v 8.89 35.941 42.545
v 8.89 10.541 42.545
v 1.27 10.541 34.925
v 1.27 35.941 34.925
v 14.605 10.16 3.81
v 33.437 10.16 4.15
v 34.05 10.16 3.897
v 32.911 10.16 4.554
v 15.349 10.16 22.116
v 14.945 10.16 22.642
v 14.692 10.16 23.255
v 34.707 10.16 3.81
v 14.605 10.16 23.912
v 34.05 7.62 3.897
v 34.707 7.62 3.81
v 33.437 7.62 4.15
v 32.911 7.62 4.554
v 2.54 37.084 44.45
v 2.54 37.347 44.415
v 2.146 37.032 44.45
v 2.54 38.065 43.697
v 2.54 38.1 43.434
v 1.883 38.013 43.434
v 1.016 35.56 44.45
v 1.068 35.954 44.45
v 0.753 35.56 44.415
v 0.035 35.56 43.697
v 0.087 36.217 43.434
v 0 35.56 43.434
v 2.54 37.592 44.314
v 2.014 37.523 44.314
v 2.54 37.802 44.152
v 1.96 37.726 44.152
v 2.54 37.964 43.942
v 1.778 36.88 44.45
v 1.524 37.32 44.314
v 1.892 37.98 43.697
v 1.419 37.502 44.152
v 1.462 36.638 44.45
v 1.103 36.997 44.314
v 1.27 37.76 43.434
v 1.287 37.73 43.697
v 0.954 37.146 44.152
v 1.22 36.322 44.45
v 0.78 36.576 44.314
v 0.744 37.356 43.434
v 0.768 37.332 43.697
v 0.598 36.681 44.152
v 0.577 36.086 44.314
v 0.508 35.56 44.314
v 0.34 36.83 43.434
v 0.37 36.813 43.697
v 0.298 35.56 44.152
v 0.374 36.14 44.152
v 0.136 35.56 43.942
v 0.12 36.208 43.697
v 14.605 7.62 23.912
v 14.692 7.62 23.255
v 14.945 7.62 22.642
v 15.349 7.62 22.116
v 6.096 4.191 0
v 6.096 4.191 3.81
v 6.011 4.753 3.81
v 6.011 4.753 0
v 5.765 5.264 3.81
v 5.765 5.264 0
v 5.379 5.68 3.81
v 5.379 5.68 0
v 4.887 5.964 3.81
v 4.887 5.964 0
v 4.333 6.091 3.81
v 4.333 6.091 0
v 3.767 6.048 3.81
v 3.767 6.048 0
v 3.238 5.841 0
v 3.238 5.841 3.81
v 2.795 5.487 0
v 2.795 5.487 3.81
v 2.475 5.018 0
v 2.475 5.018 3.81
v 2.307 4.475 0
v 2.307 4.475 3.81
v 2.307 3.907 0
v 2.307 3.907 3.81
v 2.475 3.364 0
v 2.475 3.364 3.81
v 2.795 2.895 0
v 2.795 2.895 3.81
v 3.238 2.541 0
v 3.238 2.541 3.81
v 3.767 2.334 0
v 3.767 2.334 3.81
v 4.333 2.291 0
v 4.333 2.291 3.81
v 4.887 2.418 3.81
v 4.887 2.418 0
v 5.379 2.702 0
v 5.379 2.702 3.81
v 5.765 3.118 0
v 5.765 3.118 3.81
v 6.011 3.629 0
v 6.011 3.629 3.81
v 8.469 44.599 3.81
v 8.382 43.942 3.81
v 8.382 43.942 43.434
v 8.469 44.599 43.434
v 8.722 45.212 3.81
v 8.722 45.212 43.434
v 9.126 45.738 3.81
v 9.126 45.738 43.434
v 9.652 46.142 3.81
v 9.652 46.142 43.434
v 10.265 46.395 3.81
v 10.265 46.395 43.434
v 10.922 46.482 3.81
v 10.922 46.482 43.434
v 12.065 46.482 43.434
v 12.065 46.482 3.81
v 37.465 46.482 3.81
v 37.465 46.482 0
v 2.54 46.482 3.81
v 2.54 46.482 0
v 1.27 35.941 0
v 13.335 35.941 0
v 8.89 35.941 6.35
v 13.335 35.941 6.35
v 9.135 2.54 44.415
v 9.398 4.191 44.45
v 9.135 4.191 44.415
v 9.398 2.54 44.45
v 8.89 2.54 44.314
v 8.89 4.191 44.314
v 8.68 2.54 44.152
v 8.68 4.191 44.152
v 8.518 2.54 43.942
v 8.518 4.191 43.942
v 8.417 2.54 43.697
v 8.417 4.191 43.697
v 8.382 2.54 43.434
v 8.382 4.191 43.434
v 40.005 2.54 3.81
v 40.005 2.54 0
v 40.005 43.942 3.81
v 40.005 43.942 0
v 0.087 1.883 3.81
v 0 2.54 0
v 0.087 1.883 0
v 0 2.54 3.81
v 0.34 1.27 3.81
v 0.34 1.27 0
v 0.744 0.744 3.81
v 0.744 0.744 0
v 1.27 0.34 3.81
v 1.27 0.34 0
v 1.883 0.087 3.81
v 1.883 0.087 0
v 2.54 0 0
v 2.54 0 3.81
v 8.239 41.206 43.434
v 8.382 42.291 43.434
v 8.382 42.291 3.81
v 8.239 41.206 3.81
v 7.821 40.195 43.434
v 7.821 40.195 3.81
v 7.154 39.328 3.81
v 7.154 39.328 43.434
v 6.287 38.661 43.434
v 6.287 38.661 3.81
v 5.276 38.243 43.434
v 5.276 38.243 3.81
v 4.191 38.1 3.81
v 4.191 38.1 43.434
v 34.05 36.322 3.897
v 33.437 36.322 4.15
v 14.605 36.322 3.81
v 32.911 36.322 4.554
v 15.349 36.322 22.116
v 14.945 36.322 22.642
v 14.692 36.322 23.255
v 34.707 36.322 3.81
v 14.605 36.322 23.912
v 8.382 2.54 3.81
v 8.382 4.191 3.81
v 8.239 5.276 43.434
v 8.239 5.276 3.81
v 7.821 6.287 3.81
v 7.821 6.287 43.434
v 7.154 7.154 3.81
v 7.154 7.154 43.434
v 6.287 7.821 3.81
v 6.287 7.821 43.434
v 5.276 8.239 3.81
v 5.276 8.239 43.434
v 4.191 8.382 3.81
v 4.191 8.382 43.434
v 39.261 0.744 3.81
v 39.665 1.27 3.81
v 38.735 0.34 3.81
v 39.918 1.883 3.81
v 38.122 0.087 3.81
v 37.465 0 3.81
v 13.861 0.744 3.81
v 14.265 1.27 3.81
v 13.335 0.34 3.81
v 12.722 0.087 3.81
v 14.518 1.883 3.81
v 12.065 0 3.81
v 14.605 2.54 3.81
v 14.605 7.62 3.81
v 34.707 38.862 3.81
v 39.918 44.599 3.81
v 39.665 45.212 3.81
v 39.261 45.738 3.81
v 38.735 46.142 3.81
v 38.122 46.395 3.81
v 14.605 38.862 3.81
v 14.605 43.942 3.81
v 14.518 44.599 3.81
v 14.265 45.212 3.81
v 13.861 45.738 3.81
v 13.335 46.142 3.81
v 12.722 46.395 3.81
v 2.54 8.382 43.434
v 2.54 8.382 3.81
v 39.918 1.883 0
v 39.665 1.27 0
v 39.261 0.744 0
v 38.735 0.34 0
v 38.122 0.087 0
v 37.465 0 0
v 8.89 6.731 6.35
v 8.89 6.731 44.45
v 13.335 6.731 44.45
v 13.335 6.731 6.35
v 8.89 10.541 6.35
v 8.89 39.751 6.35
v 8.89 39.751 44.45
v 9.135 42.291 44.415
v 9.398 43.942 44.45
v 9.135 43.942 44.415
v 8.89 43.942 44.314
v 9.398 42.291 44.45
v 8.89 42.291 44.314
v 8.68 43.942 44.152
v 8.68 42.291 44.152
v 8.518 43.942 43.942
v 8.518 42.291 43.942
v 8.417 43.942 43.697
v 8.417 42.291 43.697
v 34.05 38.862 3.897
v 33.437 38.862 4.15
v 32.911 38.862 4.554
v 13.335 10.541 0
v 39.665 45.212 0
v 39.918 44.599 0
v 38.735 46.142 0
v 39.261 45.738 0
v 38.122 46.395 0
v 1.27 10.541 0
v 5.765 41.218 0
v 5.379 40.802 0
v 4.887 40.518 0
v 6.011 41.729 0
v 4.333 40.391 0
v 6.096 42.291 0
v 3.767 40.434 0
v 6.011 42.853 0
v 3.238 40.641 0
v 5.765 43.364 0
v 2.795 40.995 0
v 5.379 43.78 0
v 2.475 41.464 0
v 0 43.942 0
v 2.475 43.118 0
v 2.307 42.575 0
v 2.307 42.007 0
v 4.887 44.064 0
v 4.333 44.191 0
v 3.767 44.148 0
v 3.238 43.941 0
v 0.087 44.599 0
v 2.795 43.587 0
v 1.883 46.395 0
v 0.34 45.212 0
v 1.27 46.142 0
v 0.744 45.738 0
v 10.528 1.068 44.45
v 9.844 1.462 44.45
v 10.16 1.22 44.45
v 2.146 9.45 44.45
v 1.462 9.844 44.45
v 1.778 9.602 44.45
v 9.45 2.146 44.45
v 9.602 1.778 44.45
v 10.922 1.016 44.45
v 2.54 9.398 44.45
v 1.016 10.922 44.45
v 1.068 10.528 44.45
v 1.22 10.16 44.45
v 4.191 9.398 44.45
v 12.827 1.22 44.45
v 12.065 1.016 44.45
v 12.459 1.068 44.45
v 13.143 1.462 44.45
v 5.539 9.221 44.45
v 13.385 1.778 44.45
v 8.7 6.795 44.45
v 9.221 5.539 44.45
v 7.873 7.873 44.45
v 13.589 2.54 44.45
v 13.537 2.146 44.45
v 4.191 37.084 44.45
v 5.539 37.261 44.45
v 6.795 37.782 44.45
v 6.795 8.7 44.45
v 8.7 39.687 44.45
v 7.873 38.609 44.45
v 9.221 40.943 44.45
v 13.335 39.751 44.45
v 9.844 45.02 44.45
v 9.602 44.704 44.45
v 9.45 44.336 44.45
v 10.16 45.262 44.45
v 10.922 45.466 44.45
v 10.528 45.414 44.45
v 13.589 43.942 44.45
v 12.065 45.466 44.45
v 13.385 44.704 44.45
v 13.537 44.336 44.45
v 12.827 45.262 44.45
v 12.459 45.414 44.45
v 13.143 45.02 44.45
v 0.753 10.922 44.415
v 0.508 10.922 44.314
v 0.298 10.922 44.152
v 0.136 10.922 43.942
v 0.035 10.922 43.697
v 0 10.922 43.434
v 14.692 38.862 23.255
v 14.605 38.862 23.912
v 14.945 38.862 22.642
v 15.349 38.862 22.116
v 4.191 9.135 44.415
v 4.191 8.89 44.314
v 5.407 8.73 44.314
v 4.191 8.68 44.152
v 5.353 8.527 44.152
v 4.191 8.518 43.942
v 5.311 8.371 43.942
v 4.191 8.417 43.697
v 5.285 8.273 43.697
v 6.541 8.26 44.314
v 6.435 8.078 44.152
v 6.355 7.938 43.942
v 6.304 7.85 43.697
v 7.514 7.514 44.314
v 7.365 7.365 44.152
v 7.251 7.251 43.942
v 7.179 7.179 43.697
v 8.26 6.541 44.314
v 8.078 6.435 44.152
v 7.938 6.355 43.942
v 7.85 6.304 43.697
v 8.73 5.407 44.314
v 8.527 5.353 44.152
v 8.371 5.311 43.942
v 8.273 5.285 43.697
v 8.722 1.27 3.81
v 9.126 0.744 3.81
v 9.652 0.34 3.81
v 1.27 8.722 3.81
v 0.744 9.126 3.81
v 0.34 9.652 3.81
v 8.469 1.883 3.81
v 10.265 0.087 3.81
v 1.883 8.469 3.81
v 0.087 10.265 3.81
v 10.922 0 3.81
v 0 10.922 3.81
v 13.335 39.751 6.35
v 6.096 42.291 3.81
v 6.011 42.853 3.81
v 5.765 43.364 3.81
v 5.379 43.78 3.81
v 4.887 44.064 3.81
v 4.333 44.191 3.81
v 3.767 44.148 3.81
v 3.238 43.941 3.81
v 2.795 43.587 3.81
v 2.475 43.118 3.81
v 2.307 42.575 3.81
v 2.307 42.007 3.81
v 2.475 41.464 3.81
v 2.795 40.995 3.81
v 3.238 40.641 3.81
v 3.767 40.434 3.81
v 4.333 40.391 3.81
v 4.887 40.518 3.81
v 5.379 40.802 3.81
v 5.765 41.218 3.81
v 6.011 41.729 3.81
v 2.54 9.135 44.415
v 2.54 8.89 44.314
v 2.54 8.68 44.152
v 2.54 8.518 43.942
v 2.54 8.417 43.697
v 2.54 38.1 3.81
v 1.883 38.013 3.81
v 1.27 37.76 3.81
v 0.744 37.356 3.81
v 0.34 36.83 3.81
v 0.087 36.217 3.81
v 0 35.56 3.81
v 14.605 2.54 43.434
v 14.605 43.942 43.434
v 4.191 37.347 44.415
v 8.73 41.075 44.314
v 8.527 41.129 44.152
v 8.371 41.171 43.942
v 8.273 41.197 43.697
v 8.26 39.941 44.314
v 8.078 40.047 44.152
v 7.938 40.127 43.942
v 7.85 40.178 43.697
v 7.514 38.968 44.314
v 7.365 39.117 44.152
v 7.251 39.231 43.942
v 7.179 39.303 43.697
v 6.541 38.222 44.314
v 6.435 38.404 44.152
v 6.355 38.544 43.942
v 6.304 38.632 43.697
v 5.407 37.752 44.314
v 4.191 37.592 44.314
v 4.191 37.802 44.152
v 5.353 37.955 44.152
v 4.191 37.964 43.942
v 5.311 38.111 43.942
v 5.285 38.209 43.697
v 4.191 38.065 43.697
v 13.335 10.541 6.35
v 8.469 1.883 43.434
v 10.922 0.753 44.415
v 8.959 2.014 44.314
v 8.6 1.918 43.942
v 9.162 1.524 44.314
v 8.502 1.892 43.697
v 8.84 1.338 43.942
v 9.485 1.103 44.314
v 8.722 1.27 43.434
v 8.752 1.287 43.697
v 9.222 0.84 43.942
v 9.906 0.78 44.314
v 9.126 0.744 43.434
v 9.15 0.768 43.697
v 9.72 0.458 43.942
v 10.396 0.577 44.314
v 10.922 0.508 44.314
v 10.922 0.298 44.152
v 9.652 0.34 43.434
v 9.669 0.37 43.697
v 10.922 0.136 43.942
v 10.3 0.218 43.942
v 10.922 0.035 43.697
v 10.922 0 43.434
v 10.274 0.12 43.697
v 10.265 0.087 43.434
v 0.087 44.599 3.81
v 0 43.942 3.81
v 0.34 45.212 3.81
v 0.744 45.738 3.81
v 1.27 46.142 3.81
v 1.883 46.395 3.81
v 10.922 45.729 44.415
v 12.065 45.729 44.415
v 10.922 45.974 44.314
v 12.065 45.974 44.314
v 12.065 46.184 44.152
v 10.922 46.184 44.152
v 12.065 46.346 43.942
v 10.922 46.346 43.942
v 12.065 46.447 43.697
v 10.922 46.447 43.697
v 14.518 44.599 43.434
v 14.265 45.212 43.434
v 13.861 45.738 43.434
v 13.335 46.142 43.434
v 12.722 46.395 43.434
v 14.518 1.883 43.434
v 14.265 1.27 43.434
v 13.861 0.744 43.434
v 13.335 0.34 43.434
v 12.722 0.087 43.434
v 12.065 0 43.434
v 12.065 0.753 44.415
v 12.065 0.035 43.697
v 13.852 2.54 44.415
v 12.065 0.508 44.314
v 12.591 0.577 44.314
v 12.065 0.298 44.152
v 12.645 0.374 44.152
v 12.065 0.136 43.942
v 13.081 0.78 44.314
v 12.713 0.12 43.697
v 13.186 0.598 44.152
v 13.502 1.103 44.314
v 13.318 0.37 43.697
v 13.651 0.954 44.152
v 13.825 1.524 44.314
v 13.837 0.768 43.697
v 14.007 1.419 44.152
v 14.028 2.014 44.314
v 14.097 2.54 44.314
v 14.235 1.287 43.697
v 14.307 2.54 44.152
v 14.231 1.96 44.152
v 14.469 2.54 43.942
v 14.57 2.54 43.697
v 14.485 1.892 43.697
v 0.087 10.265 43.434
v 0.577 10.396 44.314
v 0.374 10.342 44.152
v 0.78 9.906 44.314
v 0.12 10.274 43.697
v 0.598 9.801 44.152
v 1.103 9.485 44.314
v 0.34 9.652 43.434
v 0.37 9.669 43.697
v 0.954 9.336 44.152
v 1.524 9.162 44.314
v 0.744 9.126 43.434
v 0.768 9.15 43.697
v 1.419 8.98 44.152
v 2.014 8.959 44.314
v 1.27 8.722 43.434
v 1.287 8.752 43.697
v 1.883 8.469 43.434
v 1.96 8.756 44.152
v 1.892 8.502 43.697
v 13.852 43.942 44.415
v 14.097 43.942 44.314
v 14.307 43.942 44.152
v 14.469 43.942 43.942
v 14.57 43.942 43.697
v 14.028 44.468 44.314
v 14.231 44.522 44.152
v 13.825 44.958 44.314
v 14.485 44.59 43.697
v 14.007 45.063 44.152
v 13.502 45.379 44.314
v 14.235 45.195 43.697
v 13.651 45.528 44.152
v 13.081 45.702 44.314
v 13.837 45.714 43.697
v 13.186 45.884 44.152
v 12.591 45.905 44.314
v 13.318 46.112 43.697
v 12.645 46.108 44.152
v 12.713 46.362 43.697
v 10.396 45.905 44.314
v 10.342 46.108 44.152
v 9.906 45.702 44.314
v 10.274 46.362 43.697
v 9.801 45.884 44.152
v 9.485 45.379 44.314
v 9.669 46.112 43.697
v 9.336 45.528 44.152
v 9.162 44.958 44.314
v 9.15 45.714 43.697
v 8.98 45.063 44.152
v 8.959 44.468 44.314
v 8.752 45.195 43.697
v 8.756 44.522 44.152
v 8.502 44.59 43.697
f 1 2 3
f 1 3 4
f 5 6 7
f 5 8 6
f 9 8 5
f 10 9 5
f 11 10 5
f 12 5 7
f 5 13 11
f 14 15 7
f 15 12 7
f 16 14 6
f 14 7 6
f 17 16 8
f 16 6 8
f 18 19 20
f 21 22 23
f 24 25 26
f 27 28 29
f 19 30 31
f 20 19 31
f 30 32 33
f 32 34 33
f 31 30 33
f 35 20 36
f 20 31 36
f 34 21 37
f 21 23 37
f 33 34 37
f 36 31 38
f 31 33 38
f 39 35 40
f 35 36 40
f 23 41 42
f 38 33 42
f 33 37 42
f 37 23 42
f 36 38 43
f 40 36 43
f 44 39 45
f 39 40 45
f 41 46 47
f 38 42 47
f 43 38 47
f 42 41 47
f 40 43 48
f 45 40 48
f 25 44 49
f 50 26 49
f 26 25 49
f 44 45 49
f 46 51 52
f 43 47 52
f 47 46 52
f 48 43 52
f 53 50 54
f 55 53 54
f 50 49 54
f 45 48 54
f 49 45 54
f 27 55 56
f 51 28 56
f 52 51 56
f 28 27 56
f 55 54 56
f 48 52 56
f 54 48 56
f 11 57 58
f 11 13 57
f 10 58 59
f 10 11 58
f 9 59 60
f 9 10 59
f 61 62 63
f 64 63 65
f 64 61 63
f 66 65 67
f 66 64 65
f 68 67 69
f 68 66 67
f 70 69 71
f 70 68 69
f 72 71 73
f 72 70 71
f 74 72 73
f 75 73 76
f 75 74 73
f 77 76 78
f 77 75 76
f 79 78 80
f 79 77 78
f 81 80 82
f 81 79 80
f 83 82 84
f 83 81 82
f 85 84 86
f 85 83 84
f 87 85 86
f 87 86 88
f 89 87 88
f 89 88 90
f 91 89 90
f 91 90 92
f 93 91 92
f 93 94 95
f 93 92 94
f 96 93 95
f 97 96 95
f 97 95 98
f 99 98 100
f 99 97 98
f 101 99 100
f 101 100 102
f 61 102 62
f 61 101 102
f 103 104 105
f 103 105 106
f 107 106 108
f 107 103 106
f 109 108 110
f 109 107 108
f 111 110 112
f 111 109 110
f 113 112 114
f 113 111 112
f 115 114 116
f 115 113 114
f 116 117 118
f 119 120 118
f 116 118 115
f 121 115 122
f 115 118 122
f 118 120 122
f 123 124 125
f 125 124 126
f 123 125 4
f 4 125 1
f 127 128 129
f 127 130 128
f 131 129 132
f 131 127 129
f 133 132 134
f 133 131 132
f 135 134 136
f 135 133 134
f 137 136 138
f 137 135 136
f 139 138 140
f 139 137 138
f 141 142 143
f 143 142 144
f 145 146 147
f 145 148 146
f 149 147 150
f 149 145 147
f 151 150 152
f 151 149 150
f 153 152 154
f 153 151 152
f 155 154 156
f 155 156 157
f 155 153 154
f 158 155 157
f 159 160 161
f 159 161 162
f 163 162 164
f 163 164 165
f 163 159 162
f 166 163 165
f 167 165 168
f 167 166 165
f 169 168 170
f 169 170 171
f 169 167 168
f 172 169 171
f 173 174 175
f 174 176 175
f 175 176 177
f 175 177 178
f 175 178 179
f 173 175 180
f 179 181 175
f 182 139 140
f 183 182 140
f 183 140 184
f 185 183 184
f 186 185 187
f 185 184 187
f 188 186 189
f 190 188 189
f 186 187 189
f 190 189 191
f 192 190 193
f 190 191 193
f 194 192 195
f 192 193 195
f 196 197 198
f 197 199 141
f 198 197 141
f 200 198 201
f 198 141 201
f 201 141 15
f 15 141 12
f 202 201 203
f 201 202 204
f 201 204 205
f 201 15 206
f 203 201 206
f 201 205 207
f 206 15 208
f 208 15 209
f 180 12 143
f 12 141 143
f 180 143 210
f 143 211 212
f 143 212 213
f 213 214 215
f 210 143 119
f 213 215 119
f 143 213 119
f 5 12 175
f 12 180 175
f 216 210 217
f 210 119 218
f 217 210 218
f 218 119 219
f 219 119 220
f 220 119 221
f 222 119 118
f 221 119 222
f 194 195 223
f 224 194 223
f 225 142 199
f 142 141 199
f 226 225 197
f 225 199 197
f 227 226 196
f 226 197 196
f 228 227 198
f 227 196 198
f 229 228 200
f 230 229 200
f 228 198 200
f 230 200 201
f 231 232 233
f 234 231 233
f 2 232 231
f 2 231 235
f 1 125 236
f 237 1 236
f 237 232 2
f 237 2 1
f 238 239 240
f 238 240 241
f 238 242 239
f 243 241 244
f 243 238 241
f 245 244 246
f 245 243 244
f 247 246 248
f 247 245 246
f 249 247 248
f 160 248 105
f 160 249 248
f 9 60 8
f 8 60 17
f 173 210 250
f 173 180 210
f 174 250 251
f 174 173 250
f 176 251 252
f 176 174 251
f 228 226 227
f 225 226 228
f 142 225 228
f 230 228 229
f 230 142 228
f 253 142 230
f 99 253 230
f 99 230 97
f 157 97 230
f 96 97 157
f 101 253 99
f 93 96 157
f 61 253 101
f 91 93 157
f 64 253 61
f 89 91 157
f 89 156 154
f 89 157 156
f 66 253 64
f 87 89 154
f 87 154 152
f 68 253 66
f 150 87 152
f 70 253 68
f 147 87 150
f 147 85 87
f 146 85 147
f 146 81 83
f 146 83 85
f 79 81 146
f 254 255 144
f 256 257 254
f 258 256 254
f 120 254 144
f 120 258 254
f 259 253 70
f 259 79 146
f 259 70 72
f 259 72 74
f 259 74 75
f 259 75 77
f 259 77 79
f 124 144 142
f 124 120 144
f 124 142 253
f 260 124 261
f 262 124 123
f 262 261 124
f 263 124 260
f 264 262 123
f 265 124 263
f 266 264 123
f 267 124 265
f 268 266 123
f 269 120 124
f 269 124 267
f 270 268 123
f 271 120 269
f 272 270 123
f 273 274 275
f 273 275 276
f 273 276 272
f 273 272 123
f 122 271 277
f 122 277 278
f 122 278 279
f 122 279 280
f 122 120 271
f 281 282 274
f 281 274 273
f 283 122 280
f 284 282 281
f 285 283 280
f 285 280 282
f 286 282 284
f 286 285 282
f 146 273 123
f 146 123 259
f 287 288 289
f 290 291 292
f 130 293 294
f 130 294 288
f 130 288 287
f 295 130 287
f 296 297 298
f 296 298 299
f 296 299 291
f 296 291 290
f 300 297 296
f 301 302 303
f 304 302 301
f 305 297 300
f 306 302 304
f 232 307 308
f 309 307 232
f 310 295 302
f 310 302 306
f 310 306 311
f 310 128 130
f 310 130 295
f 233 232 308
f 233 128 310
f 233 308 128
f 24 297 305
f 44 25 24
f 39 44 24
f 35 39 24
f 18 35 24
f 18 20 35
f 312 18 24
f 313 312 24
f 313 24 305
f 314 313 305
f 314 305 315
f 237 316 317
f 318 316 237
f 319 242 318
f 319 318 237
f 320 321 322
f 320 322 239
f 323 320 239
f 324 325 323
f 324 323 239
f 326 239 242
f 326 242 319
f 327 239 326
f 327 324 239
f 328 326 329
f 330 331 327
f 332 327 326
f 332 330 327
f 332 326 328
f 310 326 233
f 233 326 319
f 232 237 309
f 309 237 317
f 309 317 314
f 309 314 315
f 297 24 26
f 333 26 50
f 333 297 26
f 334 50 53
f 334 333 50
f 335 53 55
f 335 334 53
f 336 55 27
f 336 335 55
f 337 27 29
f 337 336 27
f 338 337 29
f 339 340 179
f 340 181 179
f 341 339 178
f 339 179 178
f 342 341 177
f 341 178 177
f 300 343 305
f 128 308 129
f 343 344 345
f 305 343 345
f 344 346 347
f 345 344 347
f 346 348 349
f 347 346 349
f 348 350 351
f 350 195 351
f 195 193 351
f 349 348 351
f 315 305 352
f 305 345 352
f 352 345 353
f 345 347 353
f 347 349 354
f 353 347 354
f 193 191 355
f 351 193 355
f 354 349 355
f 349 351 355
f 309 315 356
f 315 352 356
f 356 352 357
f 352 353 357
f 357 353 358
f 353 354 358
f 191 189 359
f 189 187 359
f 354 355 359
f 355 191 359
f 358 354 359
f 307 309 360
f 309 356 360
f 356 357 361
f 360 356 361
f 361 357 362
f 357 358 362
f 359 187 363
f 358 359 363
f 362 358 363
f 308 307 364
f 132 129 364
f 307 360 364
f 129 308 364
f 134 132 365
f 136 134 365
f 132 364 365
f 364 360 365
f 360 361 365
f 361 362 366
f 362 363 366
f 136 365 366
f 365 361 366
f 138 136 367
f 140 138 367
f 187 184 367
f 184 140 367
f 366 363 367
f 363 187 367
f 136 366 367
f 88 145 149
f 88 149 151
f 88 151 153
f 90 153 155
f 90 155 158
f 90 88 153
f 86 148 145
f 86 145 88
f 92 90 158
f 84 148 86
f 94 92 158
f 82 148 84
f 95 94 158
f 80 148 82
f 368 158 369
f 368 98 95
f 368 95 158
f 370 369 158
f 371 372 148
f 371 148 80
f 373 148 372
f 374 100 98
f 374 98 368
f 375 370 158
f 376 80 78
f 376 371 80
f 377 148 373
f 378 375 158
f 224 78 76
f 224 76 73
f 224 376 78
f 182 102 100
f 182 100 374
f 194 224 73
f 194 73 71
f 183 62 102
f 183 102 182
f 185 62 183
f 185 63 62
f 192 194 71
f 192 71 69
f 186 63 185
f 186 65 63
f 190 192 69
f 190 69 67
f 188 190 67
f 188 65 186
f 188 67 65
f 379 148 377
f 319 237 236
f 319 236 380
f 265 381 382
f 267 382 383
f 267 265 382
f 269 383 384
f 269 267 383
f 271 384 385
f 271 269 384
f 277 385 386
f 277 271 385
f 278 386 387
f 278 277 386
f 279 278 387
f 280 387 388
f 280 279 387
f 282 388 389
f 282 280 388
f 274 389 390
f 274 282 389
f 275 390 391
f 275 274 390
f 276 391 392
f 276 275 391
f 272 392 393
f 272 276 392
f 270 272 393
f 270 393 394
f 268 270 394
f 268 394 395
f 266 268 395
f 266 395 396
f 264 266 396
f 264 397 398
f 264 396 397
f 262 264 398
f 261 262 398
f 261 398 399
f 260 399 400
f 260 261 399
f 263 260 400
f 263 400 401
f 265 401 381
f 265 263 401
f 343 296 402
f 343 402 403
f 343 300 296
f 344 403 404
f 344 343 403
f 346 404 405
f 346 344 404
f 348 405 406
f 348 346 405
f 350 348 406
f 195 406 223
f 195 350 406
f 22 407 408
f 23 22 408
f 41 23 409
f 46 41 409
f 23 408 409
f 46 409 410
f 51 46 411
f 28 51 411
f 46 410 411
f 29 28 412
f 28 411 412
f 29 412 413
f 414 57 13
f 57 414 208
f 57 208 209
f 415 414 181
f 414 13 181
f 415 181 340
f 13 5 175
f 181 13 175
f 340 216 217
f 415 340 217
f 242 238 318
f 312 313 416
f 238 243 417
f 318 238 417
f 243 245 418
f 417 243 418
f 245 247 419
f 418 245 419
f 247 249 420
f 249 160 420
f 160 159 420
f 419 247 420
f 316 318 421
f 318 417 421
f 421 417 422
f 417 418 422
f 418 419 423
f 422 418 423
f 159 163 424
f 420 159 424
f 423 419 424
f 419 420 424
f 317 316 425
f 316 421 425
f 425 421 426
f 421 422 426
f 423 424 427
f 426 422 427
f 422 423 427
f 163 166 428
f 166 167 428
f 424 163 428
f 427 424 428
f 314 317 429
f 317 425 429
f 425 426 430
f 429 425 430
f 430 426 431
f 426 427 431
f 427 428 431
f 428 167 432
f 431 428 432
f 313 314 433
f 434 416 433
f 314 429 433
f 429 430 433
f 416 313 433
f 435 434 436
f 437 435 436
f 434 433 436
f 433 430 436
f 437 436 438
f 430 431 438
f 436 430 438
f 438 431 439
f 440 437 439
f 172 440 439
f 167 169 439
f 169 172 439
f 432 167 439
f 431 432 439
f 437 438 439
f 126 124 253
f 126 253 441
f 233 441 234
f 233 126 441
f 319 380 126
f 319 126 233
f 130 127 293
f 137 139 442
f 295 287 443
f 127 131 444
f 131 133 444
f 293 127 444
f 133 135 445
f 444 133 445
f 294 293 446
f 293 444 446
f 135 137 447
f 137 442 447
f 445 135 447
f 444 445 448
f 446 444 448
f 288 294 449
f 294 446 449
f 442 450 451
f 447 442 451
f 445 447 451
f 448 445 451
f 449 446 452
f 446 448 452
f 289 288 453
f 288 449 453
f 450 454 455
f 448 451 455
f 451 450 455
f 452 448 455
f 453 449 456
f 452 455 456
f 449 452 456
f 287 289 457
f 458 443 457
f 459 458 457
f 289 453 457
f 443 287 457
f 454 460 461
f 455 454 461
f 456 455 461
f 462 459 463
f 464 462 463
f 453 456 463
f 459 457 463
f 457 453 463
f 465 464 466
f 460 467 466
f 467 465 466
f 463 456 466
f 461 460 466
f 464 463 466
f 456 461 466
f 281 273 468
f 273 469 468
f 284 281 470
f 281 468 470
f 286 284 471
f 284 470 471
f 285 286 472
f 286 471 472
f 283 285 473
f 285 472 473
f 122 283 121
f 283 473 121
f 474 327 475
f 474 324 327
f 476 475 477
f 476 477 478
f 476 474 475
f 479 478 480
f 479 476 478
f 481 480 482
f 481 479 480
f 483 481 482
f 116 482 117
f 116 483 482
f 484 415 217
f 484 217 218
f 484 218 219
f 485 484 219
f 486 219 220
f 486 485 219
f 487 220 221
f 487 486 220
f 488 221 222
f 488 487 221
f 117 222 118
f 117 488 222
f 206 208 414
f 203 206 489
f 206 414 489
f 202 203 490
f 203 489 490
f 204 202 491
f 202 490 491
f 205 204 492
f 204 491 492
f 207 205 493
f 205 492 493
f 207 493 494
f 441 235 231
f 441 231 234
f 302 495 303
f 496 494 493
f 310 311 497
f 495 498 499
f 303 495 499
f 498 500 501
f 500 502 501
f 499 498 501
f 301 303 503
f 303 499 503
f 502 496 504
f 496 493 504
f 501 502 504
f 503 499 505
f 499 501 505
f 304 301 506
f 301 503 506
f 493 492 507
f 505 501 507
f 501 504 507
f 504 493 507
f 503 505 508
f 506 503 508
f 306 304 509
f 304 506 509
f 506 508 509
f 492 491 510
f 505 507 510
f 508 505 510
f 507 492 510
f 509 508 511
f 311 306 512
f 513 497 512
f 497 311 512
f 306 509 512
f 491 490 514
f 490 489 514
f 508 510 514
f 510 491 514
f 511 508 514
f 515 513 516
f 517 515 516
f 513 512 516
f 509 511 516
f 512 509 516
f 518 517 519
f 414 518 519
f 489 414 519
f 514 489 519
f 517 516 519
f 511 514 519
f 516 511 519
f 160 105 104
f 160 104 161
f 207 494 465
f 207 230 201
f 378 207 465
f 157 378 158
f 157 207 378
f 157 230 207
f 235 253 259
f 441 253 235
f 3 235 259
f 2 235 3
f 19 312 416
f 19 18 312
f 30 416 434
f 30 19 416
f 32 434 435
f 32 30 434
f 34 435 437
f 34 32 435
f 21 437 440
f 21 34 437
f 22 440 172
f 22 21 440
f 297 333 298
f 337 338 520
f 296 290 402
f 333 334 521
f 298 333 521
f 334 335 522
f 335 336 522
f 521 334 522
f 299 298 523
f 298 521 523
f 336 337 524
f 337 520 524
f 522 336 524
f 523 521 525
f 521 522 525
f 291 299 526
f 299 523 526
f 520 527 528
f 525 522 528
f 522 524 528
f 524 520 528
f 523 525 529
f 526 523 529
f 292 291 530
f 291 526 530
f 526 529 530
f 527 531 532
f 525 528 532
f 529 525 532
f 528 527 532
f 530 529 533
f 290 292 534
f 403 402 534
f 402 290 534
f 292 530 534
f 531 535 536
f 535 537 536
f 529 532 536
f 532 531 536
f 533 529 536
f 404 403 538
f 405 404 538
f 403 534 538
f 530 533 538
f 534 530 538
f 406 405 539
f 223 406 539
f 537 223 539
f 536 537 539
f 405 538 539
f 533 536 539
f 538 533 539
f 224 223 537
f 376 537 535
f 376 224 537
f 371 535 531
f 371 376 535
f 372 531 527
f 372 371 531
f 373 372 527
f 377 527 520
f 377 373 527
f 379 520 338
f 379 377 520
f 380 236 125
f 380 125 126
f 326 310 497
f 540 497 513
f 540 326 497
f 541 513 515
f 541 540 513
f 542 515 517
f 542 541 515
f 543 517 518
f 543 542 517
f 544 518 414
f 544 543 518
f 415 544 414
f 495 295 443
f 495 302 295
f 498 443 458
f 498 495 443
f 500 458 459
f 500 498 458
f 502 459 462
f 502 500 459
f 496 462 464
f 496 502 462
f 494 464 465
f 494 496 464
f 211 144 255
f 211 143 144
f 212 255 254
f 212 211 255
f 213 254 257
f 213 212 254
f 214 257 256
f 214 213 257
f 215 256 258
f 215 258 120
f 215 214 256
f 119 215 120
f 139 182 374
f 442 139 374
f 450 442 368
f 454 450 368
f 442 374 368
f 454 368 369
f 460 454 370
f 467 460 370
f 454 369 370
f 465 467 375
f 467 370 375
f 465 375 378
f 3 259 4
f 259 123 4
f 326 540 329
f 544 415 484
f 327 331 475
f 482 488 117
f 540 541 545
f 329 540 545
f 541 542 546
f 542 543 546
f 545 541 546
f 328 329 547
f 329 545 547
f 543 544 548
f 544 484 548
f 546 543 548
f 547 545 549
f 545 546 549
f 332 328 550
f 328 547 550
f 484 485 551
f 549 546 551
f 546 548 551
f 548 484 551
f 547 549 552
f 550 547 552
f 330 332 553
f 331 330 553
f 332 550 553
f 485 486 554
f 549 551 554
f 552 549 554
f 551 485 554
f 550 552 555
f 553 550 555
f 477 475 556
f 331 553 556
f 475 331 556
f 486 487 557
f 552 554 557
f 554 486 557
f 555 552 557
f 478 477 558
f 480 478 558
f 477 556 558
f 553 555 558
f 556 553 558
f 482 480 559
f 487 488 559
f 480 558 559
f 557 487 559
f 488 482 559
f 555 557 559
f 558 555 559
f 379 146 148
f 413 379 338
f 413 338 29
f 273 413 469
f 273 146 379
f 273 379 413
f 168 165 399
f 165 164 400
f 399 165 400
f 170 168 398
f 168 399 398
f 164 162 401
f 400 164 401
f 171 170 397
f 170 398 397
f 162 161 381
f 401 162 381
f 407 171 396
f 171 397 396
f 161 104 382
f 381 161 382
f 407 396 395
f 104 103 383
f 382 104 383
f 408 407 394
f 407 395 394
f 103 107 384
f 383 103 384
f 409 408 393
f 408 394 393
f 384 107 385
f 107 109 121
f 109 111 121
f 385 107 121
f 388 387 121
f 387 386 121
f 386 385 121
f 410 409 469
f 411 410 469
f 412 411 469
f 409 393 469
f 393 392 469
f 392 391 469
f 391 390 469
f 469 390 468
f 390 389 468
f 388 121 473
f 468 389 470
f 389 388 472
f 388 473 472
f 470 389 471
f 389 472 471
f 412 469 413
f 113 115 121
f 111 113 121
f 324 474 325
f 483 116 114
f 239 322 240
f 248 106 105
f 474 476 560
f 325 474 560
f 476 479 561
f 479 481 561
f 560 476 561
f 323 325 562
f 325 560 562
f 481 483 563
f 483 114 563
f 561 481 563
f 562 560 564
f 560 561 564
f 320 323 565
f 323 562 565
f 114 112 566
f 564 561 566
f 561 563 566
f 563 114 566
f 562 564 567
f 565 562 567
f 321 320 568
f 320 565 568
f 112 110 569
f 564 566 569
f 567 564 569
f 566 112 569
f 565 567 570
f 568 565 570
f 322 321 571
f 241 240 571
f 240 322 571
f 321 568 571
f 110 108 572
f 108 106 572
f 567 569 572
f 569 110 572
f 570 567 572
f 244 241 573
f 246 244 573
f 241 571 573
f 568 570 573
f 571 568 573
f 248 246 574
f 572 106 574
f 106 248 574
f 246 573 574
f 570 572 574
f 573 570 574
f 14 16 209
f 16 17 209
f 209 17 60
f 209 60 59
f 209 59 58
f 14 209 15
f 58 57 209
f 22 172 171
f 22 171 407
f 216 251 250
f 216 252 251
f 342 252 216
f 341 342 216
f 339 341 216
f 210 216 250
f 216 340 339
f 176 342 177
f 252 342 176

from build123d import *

# Parameters (mm, degrees)
SKETCH1_W           = 14.605
SKETCH1_H           = 46.482
SKETCH1_R           = 1.905
BOSS_EXTRUDE1_DEPTH = 44.45
SKETCH2_W           = 4.445
SKETCH2_H           = 33.02
CUT_EXTRUDE1_DEPTH  = 38.1
SKETCH3_W           = 42.545
SKETCH3_H           = 25.4
CUT_EXTRUDE2_DEPTH  = 12.065
CUT_EXTRUDE3_DEPTH  = 40.64
SKETCH5_W           = 25.4
SKETCH5_H           = 46.482
BOSS_EXTRUDE2_DEPTH = 3.81
FILLET1_R           = 2.54
FILLET2_R           = 1.016
CHAMFER1_SIZE       = 7.62
BOSS_EXTRUDE3_START = -7.62
BOSS_EXTRUDE3_DEPTH = 2.54
FILLET4_R           = 2.54


with BuildPart() as part:
    # Sketch1 → Boss-Extrude1 (new body)
    with BuildSketch(Plane.XY):
        with Locations((7.3025, 23.241)):
            Rectangle(SKETCH1_W, SKETCH1_H)
        with Locations((4.191, 42.291)):
            Circle(SKETCH1_R, mode=Mode.SUBTRACT)
        with Locations((4.191, 4.191)):
            Circle(SKETCH1_R, mode=Mode.SUBTRACT)
    extrude(amount=BOSS_EXTRUDE1_DEPTH)

    # Sketch2 → Cut-Extrude1 (cut)
    with BuildSketch(Plane.XY.offset(44.45)):
        with Locations((11.1125, 23.241)):
            Rectangle(SKETCH2_W, SKETCH2_H)
    extrude(amount=-CUT_EXTRUDE1_DEPTH, mode=Mode.SUBTRACT)

    # Sketch3 → Cut-Extrude2 (cut)
    with BuildSketch(Plane.ZY.offset(-13.335)):
        with Locations((21.2725, 23.241)):
            Rectangle(SKETCH3_W, SKETCH3_H)
    extrude(amount=CUT_EXTRUDE2_DEPTH, mode=Mode.SUBTRACT)

    # Sketch4 → Cut-Extrude3 (cut)
    with BuildSketch(Plane.XY.offset(44.45)):
        with BuildLine():
            Line((4.191, 38.1), (0, 38.1))
            Line((0, 38.1), (0, 46.482))
            Line((0, 46.482), (8.382, 46.482))
            Line((8.382, 46.482), (8.382, 42.291))
            ThreePointArc((8.382, 42.291), (7.15448452, 39.32751548), (4.191, 38.1))
        make_face()
        with BuildLine():
            Line((4.191, 8.382), (0, 8.382))
            Line((0, 8.382), (0, 0))
            Line((0, 0), (8.382, 0))
            Line((8.382, 0), (8.382, 4.191))
            ThreePointArc((8.382, 4.191), (7.15448452, 7.15448452), (4.191, 8.382))
        make_face()
    extrude(amount=-CUT_EXTRUDE3_DEPTH, mode=Mode.SUBTRACT)

    # Sketch5 → Boss-Extrude2 (add)
    with BuildSketch(Plane(origin=(0, 0, 0), x_dir=(-1, 0, 0), z_dir=(0, 0, -1))):
        with Locations((-27.305, 23.241)):
            Rectangle(SKETCH5_W, SKETCH5_H)
    extrude(amount=-BOSS_EXTRUDE2_DEPTH)

    # Fillet1
    fillet1_edges = [part.edges().sort_by_distance(p)[0] for p in [
        (8.382, 46.482, 24.13),
        (0, 38.1, 24.13),
        (0, 8.382, 24.13),
        (8.382, 0, 24.13),
        (0, 0, 1.905),
        (14.605, 0, 24.13),
        (14.605, 46.482, 24.13),
        (0, 46.482, 1.905),
        (40.005, 0, 1.905),
        (40.005, 46.482, 1.905),
    ]]
    fillet(fillet1_edges, radius=FILLET1_R)

    # Fillet2
    fillet2_edges = [part.edges().sort_by_distance(p)[0] for p in [
        (11.4935, 0, 44.45),
        (0, 23.241, 44.45),
        (11.4935, 46.482, 44.45),
        (8.382, 3.3655, 44.45),
        (14.605, 23.241, 44.45),
        (3.3655, 38.1, 44.45),
        (13.861051224, 45.738051224, 44.45),
        (13.861051224, 0.743948776, 44.45),
        (9.125948776, 0.743948776, 44.45),
        (0.743948776, 9.125948776, 44.45),
        (0.743948776, 37.356051224, 44.45),
        (9.125948776, 45.738051224, 44.45),
        (7.15448452, 39.32751548, 44.45),
        (8.382, 43.1165, 44.45),
        (7.15448452, 7.15448452, 44.45),
        (3.3655, 8.382, 44.45),
    ]]
    fillet(fillet2_edges, radius=FILLET2_R)

    # Chamfer1
    chamfer1_edges = [part.edges().sort_by_distance(p)[0] for p in [
        (1.27, 23.241, 42.545),
    ]]
    chamfer(chamfer1_edges, length=CHAMFER1_SIZE - 0.0001)  # a hair under: the kernel refuses the full size

    # Sketch6 → Boss-Extrude3 (add)
    with BuildSketch(Plane.XZ.offset(BOSS_EXTRUDE3_START)):
        Polygon((14.605, 22.86), (33.655, 3.81), (14.605, 3.81), align=None)
    boss_extrude3 = extrude(amount=-BOSS_EXTRUDE3_DEPTH)

    # Mirror1: Boss-Extrude3 across plane
    add(boss_extrude3.mirror(Plane(origin=(0, 23.241, 0), x_dir=(0, 0, 1), z_dir=(0, -1, 0))))

    # Fillet4
    fillet4_edges = [part.edges().sort_by_distance(p)[0] for p in [
        (14.605, 8.89, 22.86),
        (33.655, 8.89, 3.81),
        (14.605, 37.592, 22.86),
        (33.655, 37.592, 3.81),
    ]]
    fillet(fillet4_edges, radius=FILLET4_R)


solid = part.part
